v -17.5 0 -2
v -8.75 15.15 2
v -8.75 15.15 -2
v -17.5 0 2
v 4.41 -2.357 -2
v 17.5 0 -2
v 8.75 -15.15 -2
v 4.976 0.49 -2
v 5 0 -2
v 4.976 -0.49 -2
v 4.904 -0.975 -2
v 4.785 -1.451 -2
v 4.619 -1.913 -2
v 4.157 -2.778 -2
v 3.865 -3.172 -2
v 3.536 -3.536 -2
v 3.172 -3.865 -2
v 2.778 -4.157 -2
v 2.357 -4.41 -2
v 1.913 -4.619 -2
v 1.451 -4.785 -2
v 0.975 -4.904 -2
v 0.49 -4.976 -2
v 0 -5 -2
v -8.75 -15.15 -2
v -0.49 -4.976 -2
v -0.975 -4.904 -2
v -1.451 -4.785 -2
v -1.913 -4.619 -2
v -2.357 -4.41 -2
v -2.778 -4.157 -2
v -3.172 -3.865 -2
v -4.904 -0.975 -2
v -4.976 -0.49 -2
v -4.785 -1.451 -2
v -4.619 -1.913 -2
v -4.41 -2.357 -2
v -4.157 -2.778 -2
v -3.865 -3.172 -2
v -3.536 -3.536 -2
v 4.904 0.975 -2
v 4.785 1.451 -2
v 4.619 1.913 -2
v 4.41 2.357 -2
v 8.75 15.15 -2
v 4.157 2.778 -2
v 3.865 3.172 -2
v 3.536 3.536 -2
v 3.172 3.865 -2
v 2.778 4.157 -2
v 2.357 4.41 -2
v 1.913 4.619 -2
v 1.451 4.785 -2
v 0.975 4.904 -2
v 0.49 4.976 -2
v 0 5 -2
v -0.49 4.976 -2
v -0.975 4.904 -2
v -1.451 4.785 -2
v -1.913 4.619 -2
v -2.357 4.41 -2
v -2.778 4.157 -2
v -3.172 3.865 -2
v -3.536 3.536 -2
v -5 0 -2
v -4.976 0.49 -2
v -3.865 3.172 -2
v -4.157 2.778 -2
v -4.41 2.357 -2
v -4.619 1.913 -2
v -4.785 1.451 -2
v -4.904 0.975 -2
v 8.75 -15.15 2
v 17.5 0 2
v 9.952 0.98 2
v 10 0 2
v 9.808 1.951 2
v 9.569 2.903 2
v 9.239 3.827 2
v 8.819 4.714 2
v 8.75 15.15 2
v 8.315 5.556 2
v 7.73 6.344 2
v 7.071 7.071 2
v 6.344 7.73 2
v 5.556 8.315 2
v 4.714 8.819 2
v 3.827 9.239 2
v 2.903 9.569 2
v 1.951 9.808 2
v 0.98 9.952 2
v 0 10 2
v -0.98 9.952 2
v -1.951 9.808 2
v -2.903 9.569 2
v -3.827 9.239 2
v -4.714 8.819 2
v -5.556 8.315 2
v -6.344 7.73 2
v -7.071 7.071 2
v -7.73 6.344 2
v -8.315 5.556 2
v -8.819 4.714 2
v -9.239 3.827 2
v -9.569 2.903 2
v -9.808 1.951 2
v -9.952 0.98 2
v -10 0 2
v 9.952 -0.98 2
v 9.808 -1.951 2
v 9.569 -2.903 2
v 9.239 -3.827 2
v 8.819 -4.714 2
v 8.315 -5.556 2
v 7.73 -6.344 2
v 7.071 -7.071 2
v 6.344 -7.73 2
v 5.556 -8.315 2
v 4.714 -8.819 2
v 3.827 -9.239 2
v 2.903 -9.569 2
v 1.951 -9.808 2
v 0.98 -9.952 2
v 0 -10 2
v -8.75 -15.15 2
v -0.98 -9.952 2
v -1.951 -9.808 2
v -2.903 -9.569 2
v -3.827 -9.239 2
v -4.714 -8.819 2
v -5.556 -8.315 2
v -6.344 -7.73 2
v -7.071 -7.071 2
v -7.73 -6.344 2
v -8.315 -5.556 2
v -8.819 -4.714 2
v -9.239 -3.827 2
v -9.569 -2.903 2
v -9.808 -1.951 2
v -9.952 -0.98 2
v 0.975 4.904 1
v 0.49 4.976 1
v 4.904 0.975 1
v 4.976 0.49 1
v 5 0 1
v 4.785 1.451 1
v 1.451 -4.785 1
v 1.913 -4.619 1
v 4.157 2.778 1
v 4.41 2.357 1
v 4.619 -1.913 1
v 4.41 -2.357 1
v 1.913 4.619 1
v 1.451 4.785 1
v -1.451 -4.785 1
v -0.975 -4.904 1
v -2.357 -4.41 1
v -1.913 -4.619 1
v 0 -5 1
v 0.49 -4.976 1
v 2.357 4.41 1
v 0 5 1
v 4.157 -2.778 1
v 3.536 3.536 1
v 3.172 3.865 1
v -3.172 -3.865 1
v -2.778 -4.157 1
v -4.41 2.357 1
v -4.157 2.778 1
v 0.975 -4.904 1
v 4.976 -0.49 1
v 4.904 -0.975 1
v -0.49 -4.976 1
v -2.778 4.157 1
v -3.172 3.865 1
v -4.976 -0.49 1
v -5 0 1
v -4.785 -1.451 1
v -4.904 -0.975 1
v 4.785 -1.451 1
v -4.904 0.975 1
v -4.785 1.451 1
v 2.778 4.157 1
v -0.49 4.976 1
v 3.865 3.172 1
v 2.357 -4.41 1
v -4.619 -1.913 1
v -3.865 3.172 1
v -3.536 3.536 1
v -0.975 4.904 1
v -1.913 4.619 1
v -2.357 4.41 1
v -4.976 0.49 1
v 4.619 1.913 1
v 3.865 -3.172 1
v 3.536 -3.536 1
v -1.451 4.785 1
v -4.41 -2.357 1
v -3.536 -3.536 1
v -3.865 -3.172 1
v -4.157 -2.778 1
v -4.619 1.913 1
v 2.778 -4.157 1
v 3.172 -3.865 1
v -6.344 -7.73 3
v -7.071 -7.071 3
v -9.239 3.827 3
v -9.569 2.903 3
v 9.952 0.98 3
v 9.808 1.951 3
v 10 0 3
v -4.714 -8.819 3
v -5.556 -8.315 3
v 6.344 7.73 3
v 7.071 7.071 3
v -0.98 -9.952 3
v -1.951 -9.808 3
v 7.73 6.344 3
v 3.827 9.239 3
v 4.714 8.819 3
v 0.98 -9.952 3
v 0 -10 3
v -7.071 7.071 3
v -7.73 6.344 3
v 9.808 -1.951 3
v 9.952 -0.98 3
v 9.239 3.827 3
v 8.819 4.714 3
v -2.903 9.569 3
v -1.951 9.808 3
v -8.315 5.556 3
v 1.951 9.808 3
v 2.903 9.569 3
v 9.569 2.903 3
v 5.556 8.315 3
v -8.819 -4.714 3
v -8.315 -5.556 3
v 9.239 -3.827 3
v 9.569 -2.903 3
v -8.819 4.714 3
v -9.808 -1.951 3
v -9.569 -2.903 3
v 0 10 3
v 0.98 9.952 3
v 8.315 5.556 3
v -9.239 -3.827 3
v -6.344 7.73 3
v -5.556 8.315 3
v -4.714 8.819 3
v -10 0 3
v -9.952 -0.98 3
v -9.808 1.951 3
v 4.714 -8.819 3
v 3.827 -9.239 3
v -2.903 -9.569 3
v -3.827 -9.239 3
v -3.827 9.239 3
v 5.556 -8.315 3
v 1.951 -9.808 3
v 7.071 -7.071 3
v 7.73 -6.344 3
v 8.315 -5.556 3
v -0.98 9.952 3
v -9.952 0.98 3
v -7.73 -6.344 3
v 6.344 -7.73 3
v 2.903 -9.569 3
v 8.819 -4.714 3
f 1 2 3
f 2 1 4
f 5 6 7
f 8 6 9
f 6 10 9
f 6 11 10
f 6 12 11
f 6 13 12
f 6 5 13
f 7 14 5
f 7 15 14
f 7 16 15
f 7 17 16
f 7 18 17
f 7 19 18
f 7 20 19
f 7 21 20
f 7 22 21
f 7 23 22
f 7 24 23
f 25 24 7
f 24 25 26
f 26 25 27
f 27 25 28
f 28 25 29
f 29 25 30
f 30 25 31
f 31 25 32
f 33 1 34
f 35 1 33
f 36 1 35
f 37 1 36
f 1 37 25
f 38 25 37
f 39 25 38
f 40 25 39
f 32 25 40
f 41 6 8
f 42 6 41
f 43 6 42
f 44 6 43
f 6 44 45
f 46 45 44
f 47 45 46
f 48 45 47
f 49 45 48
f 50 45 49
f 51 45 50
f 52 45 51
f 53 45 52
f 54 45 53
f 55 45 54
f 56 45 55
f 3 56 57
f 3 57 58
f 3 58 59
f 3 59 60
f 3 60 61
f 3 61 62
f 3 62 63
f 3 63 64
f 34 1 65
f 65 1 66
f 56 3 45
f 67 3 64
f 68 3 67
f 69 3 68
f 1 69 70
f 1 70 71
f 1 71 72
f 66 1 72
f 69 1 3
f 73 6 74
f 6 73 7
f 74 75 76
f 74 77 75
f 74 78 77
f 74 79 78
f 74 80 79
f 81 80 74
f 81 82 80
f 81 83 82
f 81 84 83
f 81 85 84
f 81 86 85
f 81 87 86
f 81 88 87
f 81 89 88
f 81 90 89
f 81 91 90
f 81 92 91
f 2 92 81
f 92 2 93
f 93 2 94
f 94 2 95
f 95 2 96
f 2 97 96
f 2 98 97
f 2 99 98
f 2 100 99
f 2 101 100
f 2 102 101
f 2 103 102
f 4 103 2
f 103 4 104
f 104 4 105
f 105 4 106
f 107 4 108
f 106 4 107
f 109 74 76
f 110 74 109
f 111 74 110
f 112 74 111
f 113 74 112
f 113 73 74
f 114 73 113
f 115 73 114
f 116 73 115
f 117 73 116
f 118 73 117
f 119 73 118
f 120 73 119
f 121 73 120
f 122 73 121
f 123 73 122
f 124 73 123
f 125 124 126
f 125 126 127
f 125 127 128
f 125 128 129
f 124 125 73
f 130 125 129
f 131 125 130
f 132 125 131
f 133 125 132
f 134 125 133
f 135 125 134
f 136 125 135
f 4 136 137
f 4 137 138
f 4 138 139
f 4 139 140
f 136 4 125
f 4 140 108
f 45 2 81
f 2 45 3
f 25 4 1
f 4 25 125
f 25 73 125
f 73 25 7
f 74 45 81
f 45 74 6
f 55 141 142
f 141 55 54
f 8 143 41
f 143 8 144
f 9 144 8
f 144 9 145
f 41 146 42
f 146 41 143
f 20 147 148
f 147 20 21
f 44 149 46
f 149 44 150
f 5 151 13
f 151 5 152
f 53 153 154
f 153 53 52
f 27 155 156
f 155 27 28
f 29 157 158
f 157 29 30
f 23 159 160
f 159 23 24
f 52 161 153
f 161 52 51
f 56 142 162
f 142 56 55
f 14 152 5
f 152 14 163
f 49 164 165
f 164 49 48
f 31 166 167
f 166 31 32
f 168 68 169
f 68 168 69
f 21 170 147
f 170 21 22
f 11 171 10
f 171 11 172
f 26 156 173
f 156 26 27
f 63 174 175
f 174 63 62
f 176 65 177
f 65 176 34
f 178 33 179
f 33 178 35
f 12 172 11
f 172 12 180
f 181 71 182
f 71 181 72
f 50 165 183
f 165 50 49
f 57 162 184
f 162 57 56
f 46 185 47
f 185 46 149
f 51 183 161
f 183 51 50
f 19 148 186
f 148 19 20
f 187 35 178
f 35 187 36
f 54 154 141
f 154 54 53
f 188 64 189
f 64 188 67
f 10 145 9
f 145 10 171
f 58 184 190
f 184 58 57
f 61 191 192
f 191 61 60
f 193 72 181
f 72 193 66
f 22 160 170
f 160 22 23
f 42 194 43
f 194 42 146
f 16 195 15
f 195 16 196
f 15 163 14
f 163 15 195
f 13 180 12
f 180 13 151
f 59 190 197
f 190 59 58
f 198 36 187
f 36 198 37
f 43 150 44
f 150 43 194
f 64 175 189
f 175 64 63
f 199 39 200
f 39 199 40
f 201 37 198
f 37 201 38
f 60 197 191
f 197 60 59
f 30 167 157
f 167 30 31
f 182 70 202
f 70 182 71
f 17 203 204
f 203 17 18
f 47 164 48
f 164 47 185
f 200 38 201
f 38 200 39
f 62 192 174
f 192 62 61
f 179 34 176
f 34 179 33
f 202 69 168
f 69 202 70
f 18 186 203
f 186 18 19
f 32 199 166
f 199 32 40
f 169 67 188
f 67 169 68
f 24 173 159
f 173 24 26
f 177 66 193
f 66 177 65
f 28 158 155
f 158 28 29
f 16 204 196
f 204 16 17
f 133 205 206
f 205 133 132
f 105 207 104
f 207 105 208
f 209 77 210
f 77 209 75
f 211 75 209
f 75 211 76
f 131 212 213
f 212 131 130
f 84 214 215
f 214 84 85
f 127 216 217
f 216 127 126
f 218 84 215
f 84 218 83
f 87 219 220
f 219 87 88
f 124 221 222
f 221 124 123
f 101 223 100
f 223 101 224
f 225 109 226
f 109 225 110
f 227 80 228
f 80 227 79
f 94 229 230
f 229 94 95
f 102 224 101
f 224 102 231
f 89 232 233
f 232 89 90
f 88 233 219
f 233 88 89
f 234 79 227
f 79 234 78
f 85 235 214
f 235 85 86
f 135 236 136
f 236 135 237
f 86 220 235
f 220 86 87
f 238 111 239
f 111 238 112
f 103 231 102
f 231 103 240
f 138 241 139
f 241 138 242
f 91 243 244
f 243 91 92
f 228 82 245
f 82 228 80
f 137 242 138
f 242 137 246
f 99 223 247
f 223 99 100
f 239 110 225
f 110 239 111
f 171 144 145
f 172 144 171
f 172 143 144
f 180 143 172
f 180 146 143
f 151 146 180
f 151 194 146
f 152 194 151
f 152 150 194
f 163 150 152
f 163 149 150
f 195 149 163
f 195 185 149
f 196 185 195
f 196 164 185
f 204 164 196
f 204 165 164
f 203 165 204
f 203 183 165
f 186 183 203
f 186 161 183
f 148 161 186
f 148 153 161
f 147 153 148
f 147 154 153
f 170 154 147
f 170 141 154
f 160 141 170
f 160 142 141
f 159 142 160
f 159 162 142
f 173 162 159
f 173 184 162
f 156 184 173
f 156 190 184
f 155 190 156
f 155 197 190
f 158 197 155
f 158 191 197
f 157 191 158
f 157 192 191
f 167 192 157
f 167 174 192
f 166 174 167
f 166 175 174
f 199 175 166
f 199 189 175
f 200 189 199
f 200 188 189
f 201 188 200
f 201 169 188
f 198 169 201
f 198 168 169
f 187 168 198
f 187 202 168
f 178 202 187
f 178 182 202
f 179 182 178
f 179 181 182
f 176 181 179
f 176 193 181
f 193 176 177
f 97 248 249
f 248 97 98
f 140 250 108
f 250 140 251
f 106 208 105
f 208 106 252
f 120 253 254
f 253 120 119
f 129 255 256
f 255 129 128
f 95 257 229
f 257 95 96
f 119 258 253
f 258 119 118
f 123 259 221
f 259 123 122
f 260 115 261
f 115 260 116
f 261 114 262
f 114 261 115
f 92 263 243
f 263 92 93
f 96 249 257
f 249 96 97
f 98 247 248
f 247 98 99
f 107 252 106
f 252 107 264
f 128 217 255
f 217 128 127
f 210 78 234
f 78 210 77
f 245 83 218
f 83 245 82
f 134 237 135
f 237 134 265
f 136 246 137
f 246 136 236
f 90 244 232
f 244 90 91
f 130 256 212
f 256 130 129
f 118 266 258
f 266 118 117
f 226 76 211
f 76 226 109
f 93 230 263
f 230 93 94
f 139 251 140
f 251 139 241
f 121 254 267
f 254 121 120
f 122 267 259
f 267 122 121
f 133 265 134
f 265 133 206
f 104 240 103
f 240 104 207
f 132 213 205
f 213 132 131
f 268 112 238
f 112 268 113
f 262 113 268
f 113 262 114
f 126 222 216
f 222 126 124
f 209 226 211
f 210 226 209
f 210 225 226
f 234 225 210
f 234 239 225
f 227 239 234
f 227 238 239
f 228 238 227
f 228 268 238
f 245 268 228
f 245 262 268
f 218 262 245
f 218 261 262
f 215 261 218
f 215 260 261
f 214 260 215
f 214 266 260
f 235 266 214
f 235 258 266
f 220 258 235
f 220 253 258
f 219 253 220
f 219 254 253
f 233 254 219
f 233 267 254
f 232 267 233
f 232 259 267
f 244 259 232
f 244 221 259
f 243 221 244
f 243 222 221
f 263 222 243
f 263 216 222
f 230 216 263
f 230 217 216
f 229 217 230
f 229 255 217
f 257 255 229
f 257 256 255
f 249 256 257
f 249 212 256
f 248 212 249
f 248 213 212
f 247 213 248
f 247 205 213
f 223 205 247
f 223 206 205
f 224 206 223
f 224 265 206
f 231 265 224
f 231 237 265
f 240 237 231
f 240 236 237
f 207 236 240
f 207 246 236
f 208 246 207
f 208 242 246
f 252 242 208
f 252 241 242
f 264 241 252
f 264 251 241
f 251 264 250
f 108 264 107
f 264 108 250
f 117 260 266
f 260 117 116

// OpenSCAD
module hexagonal_plate() {
    difference() {
        // Hexagonal plate
        translate([0, 0, -2])
            linear_extrude(height=4)
                polygon(points=[
                    [17.5, 0],
                    [8.75, 15.15],
                    [-8.75, 15.15],
                    [-17.5, 0],
                    [-8.75, -15.15],
                    [8.75, -15.15]
                ]);
        
        // Central hole
        translate([0, 0, -2])
            cylinder(h=8, r=5, $fn=64);
    }
    
    // Raised pad
    translate([0, 0, 1])
        cylinder(h=2, r=10, $fn=64);
}

hexagonal_plate();
